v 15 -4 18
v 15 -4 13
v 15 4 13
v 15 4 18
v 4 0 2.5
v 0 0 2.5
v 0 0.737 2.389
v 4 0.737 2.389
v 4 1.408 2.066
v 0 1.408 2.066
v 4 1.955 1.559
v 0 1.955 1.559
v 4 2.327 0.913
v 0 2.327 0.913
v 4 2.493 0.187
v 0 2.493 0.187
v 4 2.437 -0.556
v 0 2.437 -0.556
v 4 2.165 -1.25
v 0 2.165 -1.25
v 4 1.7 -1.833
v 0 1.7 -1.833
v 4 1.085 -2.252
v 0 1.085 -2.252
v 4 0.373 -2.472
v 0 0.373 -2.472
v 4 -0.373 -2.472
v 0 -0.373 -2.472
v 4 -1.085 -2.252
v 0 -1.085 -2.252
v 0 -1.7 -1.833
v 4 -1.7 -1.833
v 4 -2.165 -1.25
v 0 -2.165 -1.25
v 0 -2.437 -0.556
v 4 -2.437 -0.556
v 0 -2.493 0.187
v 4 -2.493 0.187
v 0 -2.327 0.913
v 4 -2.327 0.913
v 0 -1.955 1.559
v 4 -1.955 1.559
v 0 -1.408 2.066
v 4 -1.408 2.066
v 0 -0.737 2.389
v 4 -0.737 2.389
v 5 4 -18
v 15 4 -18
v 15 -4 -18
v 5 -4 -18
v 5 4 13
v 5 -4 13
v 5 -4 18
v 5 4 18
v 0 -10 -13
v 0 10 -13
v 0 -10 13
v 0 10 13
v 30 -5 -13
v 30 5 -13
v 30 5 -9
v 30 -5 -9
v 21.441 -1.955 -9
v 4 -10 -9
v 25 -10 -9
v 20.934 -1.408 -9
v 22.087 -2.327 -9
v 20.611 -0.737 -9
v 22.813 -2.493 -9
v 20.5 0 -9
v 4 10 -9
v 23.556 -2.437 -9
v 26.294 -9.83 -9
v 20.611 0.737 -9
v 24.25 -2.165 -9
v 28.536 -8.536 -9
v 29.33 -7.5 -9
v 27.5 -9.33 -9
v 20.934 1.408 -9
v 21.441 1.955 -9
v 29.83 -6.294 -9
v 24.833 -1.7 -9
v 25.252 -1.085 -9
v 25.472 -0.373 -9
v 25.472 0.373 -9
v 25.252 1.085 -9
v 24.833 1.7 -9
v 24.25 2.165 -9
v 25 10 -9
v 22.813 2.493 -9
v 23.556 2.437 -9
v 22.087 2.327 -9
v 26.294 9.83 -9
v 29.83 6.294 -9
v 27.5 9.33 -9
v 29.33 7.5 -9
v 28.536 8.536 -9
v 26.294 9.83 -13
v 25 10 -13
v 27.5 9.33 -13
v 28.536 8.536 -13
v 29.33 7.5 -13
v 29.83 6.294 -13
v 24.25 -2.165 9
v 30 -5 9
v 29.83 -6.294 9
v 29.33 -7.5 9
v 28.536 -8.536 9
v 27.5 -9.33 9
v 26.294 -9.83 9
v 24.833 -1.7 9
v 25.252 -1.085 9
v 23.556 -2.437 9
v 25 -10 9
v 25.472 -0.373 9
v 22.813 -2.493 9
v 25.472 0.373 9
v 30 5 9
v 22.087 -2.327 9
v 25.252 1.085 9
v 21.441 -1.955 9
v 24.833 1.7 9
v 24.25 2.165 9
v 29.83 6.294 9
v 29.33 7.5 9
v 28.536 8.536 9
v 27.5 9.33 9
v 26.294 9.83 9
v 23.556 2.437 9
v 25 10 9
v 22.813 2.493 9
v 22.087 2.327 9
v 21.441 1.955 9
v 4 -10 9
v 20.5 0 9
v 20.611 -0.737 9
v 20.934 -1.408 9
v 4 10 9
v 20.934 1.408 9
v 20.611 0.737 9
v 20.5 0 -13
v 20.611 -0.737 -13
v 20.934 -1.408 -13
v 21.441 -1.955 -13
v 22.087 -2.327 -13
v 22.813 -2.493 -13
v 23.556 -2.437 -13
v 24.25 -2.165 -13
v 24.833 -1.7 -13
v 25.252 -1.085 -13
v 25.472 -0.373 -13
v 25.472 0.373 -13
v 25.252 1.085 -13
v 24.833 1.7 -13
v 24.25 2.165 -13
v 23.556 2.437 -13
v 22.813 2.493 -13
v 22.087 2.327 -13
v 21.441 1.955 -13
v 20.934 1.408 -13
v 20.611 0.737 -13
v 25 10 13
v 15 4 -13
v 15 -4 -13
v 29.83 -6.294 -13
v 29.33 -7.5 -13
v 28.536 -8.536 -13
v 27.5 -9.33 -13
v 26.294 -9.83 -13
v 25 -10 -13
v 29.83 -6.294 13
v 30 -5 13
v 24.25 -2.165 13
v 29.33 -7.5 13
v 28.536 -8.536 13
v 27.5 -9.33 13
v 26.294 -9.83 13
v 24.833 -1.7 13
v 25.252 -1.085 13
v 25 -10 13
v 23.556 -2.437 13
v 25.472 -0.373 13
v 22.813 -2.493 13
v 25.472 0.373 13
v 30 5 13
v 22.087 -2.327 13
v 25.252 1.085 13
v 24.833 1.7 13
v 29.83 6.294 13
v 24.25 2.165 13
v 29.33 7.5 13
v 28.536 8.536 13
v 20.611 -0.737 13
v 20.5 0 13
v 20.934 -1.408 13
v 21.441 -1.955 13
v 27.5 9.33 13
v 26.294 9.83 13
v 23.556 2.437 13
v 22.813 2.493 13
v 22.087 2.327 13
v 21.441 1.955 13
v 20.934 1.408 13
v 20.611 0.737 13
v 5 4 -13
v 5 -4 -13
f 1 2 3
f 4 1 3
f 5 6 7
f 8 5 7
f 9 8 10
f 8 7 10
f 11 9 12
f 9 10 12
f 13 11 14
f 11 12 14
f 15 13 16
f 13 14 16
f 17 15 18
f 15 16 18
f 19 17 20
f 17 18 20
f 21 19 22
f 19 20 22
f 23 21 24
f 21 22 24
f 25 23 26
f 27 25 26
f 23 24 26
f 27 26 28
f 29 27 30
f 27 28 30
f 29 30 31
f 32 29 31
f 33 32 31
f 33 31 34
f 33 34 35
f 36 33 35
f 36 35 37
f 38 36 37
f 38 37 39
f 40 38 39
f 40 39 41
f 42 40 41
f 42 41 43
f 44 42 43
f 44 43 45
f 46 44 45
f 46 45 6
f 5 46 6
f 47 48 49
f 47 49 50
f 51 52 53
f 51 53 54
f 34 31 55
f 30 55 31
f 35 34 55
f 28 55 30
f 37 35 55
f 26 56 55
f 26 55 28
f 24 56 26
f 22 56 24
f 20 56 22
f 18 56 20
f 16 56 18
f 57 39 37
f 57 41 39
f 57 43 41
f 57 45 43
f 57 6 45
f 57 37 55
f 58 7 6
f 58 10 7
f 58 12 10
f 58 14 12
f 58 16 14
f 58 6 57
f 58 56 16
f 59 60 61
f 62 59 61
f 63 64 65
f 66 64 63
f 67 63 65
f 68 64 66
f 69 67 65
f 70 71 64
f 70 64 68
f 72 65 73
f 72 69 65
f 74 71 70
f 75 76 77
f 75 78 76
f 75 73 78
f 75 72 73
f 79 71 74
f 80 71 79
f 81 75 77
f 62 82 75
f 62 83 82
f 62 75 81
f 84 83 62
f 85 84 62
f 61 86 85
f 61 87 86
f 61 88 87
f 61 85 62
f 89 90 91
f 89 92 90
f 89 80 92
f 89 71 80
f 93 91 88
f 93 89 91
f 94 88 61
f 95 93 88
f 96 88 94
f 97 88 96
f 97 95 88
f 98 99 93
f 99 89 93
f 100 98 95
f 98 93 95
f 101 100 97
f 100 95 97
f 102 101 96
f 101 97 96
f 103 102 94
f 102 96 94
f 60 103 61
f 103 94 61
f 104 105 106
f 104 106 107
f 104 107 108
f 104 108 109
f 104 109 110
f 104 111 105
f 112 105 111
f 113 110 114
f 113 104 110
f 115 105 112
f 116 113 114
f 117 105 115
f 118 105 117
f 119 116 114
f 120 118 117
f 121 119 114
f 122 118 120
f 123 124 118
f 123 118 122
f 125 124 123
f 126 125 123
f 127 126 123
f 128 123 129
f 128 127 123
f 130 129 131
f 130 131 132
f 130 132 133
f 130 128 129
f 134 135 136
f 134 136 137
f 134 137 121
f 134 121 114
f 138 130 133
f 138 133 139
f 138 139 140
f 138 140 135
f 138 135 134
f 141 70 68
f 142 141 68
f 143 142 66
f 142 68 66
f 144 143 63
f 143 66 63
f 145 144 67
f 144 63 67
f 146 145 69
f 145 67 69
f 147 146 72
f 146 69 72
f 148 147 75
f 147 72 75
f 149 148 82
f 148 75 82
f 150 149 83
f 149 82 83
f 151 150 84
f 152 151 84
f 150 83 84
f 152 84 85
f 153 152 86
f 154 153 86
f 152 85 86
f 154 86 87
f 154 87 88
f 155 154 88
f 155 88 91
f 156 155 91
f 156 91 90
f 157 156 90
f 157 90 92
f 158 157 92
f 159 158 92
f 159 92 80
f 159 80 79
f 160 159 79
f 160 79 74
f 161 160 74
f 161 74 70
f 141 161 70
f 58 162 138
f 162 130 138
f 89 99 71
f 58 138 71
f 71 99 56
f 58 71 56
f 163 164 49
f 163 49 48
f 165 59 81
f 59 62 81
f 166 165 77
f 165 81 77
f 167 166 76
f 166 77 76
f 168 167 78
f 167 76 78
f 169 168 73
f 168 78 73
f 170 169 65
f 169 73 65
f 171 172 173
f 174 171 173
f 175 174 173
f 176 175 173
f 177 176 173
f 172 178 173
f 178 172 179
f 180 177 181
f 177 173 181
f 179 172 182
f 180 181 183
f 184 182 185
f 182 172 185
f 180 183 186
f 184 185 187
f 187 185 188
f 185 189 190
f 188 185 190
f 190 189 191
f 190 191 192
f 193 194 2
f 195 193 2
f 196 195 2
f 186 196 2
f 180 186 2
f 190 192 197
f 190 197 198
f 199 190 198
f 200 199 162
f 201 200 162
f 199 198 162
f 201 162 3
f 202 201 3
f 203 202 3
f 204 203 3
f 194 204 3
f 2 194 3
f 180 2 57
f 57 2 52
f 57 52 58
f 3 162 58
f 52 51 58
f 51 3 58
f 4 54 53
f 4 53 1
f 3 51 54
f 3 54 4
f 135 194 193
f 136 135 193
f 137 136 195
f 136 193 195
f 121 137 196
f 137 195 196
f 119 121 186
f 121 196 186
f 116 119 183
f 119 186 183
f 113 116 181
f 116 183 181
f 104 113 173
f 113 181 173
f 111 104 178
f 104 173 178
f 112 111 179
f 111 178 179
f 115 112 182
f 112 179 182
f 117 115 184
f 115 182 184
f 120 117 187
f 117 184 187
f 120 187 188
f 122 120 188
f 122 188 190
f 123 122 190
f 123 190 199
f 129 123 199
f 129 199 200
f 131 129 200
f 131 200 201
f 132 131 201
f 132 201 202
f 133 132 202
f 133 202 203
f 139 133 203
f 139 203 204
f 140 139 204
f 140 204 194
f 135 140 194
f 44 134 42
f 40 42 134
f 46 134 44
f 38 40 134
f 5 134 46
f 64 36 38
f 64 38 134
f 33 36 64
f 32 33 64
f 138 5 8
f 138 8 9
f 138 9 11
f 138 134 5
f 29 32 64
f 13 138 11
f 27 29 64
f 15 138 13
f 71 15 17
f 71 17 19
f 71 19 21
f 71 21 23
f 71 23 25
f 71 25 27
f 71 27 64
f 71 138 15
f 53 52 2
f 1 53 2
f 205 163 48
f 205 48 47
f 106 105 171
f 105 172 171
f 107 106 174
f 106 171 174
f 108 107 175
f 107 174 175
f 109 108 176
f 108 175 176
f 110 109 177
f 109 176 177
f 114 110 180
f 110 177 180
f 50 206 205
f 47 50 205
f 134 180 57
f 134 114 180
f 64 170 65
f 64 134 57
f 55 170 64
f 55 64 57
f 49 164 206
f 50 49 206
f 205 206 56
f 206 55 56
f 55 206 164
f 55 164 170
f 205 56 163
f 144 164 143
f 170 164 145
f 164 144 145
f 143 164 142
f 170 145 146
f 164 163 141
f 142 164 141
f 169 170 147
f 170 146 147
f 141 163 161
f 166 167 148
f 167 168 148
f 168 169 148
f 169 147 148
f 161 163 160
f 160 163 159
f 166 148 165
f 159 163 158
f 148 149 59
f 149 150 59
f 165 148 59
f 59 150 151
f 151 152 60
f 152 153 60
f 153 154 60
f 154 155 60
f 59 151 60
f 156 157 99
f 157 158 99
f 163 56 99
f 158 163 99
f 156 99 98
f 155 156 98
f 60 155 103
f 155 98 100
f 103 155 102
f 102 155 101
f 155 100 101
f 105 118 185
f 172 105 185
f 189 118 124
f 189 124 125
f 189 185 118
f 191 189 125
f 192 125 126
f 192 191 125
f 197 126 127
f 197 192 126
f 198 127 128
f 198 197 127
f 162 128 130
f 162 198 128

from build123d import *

# Parameters (mm, degrees)
BOSS_EXTRUDE1_DEPTH            = 10
FILLET1_R                      = 5
SKETCH4_W                      = 10
SKETCH4_H                      = 8
BOSS_EXTRUDE2_DEPTH            = 5
CUT_EXTRUDE1_REACH             = 42.939
SKETCH5_R                      = 2.5
CUT_EXTRUDE1_DIRECTION_2_DEPTH = 41.938978981
SKETCH6_W                      = 10
SKETCH6_H                      = 8
BOSS_EXTRUDE3_DEPTH            = 5
SKETCH7_R                      = 2.5
CUT_EXTRUDE2_DEPTH             = 5


with BuildPart() as part:
    # Sketch1 → Boss-Extrude1 (new, symmetric)
    with BuildSketch(Plane(origin=(0, 0, 0), x_dir=(1, 0, 0), z_dir=(0, 1, 0))):
        Polygon((30, -9), (30, -13), (0, -13), (0, 0), (0, 13), (30, 13), (30, 9), (29.572320394, 9), (4, 9), (4, 0), (4, -9), (29.572320394, -9), align=None)
    extrude(amount=BOSS_EXTRUDE1_DEPTH, both=True)

    # Fillet1
    fillet1_edges = [part.edges().sort_by_distance(p)[0] for p in [
        (30, -10, -11),
        (30, -10, 11),
        (30, 10, -11),
        (30, 10, 11),
    ]]
    fillet(fillet1_edges, radius=FILLET1_R)

    # Sketch4 → Boss-Extrude2 (add)
    with BuildSketch(Plane.XY.offset(13)):
        with Locations((10, 0)):
            Rectangle(SKETCH4_W, SKETCH4_H)
    extrude(amount=BOSS_EXTRUDE2_DEPTH)

    # Cut-Extrude1: up to this face of the body (flat: up to its plane)
    cut_extrude1_end = Plane(part.part.faces().sort_by_distance((14.747199742, 0, -13))[0])
    # Sketch5 → Cut-Extrude1 (cut, up to the picked face)
    with BuildSketch(Plane.XY.offset(13), mode=Mode.PRIVATE) as cut_extrude1_sk1:
        with Locations(Location((23, 0, 0), (0, 0, 180))):
            Circle(SKETCH5_R)
    cut_extrude1_tool1 = split(extrude(cut_extrude1_sk1.sketch, amount=-CUT_EXTRUDE1_REACH, mode=Mode.PRIVATE), bisect_by=cut_extrude1_end, keep=Keep.BOTH, mode=Mode.PRIVATE)
    add(cut_extrude1_tool1.solids().sort_by(Axis((23, 0, 13), (0, 0, -1)))[0], mode=Mode.SUBTRACT)

    # Sketch5 → Cut-Extrude1 direction 2 (cut)
    with BuildSketch(Plane.XY.offset(13)):
        with Locations(Location((23, 0, 0), (0, 0, 180))):
            Circle(SKETCH5_R)
    extrude(amount=CUT_EXTRUDE1_DIRECTION_2_DEPTH, mode=Mode.SUBTRACT)

    # Sketch6 → Boss-Extrude3 (add)
    with BuildSketch(Plane(origin=(0, 0, -13), x_dir=(-1, 0, 0), z_dir=(0, 0, -1))):
        with Locations((-10, 0)):
            Rectangle(SKETCH6_W, SKETCH6_H)
    extrude(amount=BOSS_EXTRUDE3_DEPTH)

    # Sketch7 → Cut-Extrude2 (cut)
    with BuildSketch(Plane.ZY):
        Circle(SKETCH7_R)
    extrude(amount=-CUT_EXTRUDE2_DEPTH, mode=Mode.SUBTRACT)


solid = part.part
